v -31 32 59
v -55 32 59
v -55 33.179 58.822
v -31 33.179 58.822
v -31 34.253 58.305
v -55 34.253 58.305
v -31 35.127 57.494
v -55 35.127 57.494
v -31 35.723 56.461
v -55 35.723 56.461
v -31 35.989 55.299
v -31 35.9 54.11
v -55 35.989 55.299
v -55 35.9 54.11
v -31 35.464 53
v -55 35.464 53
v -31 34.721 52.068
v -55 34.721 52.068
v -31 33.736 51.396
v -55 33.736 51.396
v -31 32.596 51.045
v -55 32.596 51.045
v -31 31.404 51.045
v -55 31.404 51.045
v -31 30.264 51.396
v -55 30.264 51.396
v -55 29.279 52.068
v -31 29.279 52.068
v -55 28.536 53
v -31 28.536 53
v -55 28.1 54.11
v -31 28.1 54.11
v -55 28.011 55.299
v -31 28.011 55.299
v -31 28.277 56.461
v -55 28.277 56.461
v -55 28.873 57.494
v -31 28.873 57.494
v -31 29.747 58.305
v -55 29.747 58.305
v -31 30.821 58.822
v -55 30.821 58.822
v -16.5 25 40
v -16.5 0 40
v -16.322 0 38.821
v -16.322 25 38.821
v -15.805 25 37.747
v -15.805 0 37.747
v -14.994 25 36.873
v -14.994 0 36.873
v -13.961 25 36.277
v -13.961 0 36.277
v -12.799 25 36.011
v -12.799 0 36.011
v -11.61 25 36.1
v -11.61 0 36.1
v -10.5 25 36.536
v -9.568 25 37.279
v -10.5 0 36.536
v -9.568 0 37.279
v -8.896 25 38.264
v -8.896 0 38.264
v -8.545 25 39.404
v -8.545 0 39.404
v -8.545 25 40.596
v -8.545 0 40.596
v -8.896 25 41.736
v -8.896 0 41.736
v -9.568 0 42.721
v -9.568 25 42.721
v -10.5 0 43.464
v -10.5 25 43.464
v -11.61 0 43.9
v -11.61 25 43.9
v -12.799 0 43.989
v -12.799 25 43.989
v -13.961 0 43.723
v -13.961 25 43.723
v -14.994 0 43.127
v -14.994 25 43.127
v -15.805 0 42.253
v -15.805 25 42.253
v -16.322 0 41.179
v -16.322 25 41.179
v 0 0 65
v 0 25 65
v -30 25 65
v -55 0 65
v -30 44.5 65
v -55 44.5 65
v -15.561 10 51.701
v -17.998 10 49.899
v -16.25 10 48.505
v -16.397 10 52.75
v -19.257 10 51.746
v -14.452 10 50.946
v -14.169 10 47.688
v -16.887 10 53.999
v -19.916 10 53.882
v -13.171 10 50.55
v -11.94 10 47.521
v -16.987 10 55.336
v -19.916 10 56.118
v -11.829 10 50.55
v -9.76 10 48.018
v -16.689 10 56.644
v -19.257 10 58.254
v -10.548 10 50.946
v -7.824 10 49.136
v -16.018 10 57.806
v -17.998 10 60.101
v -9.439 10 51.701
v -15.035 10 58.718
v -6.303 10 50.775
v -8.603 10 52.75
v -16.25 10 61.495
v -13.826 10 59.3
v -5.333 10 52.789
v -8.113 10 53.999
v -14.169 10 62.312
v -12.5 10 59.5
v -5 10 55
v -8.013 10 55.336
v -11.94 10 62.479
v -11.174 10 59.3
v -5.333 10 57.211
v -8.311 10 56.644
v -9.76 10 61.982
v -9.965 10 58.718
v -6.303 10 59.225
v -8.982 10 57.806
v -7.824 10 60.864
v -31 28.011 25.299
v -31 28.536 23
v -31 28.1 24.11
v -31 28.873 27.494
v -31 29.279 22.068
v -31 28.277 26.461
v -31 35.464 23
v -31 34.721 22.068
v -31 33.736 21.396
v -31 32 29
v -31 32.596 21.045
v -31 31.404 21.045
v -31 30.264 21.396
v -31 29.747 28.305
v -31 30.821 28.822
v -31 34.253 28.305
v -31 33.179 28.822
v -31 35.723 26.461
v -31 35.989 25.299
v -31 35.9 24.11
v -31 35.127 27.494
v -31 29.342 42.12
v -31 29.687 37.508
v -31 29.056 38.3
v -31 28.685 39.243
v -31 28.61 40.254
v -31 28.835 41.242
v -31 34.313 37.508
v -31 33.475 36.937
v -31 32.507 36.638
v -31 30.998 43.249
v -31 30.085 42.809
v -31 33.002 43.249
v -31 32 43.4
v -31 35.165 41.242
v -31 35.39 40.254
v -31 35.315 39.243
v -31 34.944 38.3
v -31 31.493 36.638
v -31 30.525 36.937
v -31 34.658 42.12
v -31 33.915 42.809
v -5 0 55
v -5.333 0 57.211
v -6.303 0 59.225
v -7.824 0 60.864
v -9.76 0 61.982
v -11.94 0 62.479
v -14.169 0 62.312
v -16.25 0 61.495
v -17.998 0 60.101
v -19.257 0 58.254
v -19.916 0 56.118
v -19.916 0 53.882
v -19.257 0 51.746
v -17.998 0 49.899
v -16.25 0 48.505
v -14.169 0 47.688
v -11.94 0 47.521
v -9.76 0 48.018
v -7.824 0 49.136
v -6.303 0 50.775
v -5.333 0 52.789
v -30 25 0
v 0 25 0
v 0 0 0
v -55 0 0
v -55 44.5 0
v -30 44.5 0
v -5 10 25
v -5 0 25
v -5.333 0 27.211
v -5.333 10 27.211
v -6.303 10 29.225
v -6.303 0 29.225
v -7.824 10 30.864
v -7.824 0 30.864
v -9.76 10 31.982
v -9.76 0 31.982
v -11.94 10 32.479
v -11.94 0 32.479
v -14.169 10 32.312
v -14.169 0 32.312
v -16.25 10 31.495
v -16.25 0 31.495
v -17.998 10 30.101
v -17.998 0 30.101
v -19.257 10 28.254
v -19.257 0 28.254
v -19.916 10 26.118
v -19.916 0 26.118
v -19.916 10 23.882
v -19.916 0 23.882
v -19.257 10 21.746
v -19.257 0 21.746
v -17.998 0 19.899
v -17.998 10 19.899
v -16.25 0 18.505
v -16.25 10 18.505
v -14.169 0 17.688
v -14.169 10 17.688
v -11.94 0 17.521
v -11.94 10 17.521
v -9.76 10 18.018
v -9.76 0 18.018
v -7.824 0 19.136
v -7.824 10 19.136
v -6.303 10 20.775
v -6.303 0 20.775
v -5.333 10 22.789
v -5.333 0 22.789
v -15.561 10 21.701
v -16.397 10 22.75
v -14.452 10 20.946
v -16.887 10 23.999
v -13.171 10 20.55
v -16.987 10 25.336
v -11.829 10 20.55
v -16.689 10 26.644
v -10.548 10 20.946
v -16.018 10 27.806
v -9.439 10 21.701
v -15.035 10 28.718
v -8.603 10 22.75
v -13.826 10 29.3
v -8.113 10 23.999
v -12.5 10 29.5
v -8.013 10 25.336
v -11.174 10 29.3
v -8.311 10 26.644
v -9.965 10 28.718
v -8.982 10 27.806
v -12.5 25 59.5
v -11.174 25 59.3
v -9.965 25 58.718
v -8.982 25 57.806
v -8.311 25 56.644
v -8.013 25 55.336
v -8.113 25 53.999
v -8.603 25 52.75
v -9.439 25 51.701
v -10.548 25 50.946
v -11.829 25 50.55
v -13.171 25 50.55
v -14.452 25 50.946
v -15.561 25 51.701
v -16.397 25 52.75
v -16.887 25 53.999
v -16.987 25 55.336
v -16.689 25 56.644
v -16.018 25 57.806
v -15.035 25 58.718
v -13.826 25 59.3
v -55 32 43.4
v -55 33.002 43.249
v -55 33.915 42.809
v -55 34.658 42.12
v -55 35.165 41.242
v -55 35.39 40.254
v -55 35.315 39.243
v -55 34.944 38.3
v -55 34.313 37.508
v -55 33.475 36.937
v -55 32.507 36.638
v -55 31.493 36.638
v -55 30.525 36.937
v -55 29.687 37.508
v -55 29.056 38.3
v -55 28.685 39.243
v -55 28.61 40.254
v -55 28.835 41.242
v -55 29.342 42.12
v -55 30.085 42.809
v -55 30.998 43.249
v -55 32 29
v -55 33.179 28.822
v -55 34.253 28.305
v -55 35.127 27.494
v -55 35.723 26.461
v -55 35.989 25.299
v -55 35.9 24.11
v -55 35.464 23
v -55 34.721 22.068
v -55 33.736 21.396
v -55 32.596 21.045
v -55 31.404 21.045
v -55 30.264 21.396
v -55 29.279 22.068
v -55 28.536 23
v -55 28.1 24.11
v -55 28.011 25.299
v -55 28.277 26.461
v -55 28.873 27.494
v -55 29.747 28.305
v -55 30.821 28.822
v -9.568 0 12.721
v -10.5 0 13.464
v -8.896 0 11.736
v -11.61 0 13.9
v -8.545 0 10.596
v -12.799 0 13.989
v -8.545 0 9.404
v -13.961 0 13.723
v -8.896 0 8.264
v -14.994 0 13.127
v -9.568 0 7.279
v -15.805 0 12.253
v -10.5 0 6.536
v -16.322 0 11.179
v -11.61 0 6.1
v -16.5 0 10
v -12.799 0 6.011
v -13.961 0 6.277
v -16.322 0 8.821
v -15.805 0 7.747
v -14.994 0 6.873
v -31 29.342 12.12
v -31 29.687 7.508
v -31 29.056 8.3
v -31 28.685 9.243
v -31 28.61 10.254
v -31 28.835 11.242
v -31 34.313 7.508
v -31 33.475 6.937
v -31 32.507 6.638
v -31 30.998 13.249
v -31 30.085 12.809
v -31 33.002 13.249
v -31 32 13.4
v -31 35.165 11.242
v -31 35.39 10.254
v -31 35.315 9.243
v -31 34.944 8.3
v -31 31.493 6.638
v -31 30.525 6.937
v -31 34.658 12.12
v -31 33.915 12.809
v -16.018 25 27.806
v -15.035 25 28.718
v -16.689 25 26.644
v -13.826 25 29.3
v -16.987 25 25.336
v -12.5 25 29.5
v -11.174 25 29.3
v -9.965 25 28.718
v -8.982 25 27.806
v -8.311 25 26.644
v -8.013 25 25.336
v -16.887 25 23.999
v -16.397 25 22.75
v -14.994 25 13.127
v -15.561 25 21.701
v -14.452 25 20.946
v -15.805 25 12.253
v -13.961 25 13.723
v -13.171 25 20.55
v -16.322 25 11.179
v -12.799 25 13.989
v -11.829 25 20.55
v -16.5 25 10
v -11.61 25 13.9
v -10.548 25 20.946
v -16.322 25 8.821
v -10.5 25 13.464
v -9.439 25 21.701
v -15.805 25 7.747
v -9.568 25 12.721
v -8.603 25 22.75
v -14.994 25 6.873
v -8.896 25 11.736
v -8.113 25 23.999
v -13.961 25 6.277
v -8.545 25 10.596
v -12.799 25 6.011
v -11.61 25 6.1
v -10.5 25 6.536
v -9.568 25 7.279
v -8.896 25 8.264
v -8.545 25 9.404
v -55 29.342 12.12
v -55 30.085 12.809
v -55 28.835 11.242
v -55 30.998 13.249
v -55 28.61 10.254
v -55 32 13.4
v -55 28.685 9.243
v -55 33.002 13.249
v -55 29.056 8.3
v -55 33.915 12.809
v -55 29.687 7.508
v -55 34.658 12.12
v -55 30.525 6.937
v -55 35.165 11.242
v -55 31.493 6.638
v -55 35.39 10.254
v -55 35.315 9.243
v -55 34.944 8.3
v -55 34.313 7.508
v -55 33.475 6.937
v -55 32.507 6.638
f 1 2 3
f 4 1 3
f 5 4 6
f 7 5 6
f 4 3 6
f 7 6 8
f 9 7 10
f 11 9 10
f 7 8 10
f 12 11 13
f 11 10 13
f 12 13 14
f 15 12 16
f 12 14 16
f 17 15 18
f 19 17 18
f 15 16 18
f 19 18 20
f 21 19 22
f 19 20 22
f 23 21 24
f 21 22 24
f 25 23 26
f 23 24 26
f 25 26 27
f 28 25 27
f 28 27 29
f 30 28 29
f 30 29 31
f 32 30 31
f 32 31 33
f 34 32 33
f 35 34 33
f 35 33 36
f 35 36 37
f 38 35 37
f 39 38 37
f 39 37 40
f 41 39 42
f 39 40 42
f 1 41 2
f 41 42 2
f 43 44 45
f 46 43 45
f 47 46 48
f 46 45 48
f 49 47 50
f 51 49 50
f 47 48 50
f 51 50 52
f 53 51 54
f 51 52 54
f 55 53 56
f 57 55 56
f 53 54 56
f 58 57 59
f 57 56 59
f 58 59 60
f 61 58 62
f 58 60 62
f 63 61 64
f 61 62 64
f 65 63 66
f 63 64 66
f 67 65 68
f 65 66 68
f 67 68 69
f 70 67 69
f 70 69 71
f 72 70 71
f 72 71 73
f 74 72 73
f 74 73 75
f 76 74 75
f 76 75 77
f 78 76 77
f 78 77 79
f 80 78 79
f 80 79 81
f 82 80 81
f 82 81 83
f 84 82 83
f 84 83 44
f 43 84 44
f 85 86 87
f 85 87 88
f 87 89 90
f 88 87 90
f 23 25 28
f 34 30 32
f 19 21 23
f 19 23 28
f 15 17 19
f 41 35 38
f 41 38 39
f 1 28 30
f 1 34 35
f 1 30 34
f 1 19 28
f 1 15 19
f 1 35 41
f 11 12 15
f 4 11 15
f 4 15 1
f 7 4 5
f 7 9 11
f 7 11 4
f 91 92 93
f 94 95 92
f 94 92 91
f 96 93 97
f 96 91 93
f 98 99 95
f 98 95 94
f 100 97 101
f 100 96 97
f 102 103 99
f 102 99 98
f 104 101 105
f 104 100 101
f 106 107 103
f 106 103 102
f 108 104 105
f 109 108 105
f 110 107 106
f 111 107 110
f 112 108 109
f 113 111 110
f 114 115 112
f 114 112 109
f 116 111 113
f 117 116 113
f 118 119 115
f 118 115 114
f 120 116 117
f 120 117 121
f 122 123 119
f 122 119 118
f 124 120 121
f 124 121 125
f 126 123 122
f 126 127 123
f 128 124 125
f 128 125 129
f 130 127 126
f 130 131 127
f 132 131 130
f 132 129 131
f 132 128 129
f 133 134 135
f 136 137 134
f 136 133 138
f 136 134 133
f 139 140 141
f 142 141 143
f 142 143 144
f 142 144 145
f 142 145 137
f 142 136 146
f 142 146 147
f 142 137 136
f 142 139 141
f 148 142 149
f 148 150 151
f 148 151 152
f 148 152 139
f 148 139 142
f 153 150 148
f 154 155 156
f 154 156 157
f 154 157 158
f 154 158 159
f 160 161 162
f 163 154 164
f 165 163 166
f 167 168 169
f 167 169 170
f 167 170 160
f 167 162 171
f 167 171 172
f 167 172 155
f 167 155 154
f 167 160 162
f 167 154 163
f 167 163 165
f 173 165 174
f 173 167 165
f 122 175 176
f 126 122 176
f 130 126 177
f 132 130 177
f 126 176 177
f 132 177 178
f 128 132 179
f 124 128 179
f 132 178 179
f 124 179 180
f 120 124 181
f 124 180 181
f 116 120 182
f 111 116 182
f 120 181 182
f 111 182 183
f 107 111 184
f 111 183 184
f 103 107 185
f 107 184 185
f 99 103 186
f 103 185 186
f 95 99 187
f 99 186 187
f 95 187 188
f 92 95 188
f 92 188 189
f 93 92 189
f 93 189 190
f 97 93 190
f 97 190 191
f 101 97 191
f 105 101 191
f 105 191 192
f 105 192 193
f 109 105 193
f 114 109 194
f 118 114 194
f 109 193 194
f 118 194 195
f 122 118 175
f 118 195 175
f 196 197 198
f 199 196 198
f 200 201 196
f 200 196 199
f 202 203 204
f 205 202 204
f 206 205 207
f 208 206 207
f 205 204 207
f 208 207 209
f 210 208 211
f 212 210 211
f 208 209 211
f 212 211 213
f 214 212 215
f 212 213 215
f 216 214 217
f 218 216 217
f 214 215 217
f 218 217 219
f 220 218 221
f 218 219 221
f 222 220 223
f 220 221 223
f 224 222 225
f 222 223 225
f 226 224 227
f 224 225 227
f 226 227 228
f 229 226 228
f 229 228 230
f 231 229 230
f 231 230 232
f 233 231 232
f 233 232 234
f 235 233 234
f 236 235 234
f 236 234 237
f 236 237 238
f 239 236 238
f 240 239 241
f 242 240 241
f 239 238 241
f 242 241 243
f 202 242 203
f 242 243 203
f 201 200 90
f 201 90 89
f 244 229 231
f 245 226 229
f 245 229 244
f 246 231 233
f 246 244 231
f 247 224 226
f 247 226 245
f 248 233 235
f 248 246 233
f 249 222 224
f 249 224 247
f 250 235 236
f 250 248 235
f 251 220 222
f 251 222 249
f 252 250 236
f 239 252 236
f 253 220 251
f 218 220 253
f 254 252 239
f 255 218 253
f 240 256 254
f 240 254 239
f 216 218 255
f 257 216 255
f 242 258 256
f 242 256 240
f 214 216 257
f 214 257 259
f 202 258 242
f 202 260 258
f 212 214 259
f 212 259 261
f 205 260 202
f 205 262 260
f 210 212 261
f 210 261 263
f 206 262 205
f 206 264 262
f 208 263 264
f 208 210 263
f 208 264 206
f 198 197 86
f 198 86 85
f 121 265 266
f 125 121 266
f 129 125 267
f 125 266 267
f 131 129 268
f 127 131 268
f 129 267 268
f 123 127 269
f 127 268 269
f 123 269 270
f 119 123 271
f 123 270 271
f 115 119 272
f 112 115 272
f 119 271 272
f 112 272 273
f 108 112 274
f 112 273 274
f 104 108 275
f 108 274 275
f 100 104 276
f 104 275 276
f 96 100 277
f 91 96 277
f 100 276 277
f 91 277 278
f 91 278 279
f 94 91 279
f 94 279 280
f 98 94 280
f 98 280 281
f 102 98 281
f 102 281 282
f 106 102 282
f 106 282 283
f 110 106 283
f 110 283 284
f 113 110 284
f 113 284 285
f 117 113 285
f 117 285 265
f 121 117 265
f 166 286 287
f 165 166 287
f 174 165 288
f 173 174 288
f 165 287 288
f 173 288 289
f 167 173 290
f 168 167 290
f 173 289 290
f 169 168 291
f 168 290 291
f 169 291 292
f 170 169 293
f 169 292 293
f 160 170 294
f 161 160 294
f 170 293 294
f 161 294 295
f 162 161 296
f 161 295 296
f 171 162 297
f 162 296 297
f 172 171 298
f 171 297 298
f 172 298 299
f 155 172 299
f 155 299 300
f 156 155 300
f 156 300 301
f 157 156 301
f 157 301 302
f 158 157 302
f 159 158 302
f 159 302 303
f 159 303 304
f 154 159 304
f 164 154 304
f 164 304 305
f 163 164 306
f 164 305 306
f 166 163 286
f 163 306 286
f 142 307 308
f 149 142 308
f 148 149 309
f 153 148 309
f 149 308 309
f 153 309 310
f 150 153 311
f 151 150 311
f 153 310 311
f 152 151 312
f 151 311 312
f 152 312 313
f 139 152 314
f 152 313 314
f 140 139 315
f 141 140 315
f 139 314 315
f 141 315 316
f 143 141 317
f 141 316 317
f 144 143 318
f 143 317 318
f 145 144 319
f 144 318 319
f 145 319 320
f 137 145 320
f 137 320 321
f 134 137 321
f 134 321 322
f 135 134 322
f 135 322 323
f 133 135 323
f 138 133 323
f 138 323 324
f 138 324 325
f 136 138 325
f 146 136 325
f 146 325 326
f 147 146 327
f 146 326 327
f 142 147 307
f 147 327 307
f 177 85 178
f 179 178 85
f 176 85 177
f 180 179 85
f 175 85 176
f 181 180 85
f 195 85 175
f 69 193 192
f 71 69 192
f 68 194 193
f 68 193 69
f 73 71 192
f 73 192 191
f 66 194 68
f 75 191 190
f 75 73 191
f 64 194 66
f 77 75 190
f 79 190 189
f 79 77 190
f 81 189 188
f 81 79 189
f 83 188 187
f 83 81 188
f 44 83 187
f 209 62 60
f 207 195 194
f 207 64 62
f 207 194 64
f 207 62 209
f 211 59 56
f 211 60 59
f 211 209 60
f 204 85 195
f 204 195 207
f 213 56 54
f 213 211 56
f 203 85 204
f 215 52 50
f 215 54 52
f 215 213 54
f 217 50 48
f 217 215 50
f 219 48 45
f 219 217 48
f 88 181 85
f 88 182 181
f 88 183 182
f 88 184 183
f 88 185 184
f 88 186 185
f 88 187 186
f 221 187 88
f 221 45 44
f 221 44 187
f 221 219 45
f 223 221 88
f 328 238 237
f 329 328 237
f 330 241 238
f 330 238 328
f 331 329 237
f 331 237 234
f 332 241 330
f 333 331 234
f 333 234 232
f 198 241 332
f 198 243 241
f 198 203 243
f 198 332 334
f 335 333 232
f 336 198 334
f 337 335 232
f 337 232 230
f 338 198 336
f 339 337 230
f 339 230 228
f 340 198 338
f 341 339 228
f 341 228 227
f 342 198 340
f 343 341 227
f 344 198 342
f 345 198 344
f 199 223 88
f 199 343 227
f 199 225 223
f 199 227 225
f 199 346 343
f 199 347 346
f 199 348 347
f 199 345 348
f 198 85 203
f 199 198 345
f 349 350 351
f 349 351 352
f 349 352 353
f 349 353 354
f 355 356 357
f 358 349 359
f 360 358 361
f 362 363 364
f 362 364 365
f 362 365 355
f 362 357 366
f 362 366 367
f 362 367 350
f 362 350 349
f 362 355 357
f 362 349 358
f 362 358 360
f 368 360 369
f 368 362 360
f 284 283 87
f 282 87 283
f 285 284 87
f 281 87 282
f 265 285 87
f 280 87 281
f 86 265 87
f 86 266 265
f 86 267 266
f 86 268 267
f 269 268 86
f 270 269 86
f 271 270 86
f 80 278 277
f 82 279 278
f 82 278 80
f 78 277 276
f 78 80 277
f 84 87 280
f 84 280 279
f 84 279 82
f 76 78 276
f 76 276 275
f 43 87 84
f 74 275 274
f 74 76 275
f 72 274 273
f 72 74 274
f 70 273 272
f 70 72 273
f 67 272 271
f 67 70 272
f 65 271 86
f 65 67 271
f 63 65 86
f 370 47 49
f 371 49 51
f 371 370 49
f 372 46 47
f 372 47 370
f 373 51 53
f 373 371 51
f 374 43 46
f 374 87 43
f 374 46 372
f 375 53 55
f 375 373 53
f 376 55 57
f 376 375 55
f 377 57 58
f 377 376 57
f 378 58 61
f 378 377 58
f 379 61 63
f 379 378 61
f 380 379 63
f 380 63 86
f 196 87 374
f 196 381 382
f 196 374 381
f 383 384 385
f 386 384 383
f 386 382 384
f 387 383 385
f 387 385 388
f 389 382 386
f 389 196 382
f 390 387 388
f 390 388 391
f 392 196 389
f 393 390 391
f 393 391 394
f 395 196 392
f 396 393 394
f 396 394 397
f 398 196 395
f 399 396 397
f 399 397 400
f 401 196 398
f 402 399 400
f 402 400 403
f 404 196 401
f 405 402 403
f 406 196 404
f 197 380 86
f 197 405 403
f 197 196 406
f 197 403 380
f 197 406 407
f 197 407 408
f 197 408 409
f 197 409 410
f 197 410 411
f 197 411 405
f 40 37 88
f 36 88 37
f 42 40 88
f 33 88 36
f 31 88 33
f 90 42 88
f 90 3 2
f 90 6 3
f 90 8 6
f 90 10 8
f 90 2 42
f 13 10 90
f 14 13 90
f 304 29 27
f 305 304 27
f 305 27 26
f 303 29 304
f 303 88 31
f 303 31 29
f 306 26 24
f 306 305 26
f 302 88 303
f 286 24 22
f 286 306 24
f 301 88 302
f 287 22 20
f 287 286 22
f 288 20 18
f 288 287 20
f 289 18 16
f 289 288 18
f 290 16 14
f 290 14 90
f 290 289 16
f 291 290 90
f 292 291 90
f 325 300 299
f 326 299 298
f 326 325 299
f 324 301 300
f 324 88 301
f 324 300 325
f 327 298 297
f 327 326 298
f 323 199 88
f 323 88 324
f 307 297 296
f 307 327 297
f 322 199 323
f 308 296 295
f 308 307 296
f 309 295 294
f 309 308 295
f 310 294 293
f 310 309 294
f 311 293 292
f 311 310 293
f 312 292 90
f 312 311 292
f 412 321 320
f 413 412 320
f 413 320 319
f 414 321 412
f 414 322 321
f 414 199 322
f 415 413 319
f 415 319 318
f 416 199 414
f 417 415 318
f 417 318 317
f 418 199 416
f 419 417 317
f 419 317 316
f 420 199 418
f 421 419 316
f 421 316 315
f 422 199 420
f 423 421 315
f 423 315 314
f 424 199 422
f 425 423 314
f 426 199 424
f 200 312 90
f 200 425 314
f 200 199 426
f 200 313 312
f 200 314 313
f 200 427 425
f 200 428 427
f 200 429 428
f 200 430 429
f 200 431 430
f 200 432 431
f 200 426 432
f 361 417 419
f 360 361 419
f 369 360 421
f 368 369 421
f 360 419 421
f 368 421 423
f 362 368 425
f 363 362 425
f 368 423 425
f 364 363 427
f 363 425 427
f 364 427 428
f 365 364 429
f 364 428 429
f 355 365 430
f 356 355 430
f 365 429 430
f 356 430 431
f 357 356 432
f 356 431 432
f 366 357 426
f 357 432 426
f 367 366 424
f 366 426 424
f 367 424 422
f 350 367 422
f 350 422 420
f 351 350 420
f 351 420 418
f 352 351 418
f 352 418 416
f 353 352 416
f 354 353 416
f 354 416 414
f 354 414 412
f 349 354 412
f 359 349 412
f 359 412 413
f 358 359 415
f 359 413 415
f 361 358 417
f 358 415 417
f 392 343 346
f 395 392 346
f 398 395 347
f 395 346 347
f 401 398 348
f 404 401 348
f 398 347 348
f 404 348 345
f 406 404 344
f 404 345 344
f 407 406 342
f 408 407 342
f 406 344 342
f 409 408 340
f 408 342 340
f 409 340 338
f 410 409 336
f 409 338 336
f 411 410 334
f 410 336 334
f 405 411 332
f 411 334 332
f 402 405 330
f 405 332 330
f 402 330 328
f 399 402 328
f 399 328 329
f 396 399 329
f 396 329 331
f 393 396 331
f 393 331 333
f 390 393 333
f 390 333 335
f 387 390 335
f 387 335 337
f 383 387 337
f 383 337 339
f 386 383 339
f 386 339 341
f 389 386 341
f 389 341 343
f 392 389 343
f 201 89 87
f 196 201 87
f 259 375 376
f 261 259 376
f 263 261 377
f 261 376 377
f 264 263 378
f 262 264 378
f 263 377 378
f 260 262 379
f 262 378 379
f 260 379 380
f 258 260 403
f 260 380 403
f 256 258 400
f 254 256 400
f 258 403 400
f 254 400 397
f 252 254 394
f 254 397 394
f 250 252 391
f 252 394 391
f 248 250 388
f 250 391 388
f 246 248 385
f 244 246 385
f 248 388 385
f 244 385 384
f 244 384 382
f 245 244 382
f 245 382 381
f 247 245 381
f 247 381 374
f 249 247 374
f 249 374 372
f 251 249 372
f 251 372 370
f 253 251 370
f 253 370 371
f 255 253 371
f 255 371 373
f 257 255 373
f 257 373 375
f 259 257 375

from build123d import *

# Parameters (mm, degrees)
EXTRUDE_1_DEPTH     = 65
MM_1_D              = 8
SKETCH_5_R          = 4.5
CUT_EXTRUDE_1_DEPTH = 89.741196746
SKETCH_6_R          = 7.5
CUT_EXTRUDE_2_DEPTH = 10
SKETCH_7_R          = 3.4
SKETCH_7_R_2        = 4
CUT_EXTRUDE_3_DEPTH = 24


with BuildPart() as part:
    # 草图1 → 凸台-拉伸1 (new body)
    with BuildSketch(Plane.XY):
        Polygon((-30, 44.5), (-30, 25), (0, 25), (0, 0), (-55, 0), (-55, 44.5), align=None)
    extrude(amount=EXTRUDE_1_DEPTH)

    # 大小mm 暗销孔1 (through all)
    with Locations(Plane(origin=(0, 25, 0), x_dir=(1, 0, 0), z_dir=(0, 1, 0))):
        with Locations((-12.5, -10), (-12.5, -40)):
            Hole(MM_1_D / 2)

    # 草图5 → 切除-拉伸1 (cut, through all)
    with BuildSketch(Plane(origin=(0, 25, 0), x_dir=(1, 0, 0), z_dir=(0, 1, 0))):
        with Locations(Location((-12.5, -25, 0), (0, 0, 270))):
            Circle(SKETCH_5_R)
        with Locations(Location((-12.5, -55, 0), (0, 0, 270))):
            Circle(SKETCH_5_R)
    extrude(amount=-CUT_EXTRUDE_1_DEPTH, mode=Mode.SUBTRACT)

    # 草图6 → 切除-拉伸2 (cut)
    with BuildSketch(Plane.XZ):
        with Locations((-12.5, 55)):
            Circle(SKETCH_6_R)
        with Locations((-12.5, 25)):
            Circle(SKETCH_6_R)
    extrude(amount=-CUT_EXTRUDE_2_DEPTH, mode=Mode.SUBTRACT)

    # 草图7 → 切除-拉伸3 (cut)
    with BuildSketch(Plane.ZY.offset(55)):
        with Locations((10, 32)):
            Circle(SKETCH_7_R)
        with Locations((25, 32)):
            Circle(SKETCH_7_R_2)
        with Locations((40, 32)):
            Circle(SKETCH_7_R)
        with Locations((55, 32)):
            Circle(SKETCH_7_R_2)
    extrude(amount=-CUT_EXTRUDE_3_DEPTH, mode=Mode.SUBTRACT)


solid = part.part
